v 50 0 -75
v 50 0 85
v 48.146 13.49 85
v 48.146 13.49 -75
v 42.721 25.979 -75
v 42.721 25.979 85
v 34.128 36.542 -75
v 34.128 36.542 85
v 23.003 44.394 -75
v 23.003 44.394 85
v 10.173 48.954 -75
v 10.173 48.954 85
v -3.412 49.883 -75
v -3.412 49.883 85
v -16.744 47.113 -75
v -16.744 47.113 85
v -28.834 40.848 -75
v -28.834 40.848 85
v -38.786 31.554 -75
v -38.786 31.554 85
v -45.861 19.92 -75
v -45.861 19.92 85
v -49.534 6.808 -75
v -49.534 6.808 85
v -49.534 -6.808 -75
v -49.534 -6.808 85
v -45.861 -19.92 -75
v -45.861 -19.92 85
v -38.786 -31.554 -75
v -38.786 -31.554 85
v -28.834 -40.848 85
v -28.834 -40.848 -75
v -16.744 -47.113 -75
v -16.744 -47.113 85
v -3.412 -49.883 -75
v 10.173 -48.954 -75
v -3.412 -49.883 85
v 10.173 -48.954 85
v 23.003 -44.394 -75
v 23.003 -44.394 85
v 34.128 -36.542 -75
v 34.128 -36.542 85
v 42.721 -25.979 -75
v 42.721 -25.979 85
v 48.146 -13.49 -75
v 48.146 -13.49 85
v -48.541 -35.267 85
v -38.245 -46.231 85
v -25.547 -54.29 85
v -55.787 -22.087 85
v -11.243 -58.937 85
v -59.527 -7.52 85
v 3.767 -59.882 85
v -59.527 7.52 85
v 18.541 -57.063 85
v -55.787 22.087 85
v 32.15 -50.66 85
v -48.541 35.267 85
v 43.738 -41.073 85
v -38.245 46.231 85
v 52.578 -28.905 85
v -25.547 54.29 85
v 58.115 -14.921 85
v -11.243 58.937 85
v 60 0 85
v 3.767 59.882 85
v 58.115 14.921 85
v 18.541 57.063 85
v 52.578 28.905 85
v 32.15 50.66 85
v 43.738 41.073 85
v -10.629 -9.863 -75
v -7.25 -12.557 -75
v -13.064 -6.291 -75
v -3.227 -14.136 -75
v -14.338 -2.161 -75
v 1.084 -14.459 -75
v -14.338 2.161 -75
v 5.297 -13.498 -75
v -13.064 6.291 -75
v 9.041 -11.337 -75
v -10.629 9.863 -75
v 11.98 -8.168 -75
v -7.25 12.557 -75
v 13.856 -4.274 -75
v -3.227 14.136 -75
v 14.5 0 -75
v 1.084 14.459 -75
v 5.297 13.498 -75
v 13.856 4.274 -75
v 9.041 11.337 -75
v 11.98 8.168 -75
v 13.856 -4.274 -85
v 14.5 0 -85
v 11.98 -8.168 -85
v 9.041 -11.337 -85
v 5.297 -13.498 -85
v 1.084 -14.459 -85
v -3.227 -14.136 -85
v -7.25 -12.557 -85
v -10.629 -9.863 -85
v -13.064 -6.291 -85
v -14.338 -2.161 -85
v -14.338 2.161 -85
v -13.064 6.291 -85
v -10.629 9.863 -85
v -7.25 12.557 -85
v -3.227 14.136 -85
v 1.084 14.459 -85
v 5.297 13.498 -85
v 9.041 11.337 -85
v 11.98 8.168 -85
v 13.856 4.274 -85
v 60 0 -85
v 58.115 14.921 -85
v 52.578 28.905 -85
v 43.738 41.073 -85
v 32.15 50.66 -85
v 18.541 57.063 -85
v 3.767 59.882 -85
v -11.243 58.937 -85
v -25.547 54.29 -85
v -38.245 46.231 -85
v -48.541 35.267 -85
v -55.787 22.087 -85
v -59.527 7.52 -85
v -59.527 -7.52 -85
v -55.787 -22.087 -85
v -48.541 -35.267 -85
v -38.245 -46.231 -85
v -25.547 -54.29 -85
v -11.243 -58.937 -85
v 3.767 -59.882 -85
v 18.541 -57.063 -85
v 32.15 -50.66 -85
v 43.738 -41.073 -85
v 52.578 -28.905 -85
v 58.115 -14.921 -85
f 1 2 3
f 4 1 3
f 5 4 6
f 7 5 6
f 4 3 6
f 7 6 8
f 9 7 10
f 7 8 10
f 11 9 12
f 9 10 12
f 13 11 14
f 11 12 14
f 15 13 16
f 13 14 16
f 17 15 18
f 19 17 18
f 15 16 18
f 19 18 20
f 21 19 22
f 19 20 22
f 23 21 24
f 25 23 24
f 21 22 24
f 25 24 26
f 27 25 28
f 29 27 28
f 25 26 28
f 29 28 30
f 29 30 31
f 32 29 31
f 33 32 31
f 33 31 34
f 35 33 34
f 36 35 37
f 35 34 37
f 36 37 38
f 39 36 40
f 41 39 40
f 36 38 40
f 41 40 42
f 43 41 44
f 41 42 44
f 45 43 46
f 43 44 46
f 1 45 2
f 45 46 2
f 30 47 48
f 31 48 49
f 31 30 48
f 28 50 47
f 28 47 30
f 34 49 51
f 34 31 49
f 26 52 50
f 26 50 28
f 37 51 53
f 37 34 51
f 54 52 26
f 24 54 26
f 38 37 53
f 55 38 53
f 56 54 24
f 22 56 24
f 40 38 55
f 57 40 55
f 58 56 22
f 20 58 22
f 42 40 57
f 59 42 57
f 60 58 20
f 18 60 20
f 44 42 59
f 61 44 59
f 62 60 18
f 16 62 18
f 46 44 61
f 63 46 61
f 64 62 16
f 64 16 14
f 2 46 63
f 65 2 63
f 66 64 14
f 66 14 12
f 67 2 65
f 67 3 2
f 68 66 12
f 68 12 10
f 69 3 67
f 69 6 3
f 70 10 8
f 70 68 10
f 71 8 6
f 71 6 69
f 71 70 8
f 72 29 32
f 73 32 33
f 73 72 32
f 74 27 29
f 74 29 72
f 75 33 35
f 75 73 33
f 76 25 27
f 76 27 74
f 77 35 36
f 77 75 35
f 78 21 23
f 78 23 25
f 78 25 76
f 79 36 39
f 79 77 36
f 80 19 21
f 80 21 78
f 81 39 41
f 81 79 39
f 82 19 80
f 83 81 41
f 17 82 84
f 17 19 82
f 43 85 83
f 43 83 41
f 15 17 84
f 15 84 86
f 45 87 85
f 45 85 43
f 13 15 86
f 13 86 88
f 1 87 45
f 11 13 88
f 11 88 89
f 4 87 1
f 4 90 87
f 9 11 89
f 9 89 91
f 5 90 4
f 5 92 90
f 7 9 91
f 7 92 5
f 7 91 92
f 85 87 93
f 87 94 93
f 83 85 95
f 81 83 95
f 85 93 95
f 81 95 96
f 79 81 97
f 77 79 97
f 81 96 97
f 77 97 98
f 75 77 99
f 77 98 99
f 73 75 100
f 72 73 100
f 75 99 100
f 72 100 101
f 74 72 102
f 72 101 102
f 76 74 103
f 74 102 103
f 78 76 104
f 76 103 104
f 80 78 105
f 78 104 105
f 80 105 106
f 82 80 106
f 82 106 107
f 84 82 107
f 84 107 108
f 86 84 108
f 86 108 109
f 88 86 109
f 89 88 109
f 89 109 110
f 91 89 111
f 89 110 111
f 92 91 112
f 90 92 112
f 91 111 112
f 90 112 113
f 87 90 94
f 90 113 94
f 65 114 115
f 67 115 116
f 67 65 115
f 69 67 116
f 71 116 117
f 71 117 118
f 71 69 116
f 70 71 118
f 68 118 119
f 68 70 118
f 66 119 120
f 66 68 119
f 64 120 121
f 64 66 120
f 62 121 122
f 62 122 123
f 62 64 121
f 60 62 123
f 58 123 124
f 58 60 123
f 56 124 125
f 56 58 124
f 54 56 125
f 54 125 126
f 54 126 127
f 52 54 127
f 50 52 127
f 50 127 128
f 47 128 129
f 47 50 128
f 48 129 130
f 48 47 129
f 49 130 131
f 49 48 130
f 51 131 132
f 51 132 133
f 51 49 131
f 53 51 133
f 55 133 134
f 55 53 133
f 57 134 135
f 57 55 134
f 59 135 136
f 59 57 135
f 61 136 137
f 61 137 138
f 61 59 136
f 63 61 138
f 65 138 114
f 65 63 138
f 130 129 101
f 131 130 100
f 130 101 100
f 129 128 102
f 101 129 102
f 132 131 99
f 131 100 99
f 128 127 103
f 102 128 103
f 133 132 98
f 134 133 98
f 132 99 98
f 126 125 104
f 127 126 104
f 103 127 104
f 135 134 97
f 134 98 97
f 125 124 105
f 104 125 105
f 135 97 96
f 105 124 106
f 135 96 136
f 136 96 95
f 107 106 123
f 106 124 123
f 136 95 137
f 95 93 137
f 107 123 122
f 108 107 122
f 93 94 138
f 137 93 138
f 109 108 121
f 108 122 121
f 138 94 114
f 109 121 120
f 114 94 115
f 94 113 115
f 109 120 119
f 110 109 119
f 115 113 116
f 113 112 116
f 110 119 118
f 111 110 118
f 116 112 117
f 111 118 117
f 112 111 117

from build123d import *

# Parameters (mm, degrees)
F0_R     = 60
F1_DEPTH = 85
F2_T     = -10
F3_R     = 14.5
F4_DEPTH = 25


with BuildPart() as f1:
    # F0 (on Top) → F1 (new body, symmetric)
    with BuildSketch(Plane.XY):
        Circle(F0_R)
    extrude(amount=F1_DEPTH, both=True)

    # F2
    f2_openings = [f1.faces().sort_by_distance(p)[0] for p in [
        (0, 0, 85),
    ]]
    offset(amount=F2_T, openings=f2_openings)

    # F3 (on face) → F4 (cut, symmetric)
    with BuildSketch(Plane(origin=(0, 0, -85), x_dir=(1, 0, 0), z_dir=(0, 0, -1))):
        Circle(F3_R)
    extrude(amount=F4_DEPTH, both=True, mode=Mode.SUBTRACT)


solid = f1.part
